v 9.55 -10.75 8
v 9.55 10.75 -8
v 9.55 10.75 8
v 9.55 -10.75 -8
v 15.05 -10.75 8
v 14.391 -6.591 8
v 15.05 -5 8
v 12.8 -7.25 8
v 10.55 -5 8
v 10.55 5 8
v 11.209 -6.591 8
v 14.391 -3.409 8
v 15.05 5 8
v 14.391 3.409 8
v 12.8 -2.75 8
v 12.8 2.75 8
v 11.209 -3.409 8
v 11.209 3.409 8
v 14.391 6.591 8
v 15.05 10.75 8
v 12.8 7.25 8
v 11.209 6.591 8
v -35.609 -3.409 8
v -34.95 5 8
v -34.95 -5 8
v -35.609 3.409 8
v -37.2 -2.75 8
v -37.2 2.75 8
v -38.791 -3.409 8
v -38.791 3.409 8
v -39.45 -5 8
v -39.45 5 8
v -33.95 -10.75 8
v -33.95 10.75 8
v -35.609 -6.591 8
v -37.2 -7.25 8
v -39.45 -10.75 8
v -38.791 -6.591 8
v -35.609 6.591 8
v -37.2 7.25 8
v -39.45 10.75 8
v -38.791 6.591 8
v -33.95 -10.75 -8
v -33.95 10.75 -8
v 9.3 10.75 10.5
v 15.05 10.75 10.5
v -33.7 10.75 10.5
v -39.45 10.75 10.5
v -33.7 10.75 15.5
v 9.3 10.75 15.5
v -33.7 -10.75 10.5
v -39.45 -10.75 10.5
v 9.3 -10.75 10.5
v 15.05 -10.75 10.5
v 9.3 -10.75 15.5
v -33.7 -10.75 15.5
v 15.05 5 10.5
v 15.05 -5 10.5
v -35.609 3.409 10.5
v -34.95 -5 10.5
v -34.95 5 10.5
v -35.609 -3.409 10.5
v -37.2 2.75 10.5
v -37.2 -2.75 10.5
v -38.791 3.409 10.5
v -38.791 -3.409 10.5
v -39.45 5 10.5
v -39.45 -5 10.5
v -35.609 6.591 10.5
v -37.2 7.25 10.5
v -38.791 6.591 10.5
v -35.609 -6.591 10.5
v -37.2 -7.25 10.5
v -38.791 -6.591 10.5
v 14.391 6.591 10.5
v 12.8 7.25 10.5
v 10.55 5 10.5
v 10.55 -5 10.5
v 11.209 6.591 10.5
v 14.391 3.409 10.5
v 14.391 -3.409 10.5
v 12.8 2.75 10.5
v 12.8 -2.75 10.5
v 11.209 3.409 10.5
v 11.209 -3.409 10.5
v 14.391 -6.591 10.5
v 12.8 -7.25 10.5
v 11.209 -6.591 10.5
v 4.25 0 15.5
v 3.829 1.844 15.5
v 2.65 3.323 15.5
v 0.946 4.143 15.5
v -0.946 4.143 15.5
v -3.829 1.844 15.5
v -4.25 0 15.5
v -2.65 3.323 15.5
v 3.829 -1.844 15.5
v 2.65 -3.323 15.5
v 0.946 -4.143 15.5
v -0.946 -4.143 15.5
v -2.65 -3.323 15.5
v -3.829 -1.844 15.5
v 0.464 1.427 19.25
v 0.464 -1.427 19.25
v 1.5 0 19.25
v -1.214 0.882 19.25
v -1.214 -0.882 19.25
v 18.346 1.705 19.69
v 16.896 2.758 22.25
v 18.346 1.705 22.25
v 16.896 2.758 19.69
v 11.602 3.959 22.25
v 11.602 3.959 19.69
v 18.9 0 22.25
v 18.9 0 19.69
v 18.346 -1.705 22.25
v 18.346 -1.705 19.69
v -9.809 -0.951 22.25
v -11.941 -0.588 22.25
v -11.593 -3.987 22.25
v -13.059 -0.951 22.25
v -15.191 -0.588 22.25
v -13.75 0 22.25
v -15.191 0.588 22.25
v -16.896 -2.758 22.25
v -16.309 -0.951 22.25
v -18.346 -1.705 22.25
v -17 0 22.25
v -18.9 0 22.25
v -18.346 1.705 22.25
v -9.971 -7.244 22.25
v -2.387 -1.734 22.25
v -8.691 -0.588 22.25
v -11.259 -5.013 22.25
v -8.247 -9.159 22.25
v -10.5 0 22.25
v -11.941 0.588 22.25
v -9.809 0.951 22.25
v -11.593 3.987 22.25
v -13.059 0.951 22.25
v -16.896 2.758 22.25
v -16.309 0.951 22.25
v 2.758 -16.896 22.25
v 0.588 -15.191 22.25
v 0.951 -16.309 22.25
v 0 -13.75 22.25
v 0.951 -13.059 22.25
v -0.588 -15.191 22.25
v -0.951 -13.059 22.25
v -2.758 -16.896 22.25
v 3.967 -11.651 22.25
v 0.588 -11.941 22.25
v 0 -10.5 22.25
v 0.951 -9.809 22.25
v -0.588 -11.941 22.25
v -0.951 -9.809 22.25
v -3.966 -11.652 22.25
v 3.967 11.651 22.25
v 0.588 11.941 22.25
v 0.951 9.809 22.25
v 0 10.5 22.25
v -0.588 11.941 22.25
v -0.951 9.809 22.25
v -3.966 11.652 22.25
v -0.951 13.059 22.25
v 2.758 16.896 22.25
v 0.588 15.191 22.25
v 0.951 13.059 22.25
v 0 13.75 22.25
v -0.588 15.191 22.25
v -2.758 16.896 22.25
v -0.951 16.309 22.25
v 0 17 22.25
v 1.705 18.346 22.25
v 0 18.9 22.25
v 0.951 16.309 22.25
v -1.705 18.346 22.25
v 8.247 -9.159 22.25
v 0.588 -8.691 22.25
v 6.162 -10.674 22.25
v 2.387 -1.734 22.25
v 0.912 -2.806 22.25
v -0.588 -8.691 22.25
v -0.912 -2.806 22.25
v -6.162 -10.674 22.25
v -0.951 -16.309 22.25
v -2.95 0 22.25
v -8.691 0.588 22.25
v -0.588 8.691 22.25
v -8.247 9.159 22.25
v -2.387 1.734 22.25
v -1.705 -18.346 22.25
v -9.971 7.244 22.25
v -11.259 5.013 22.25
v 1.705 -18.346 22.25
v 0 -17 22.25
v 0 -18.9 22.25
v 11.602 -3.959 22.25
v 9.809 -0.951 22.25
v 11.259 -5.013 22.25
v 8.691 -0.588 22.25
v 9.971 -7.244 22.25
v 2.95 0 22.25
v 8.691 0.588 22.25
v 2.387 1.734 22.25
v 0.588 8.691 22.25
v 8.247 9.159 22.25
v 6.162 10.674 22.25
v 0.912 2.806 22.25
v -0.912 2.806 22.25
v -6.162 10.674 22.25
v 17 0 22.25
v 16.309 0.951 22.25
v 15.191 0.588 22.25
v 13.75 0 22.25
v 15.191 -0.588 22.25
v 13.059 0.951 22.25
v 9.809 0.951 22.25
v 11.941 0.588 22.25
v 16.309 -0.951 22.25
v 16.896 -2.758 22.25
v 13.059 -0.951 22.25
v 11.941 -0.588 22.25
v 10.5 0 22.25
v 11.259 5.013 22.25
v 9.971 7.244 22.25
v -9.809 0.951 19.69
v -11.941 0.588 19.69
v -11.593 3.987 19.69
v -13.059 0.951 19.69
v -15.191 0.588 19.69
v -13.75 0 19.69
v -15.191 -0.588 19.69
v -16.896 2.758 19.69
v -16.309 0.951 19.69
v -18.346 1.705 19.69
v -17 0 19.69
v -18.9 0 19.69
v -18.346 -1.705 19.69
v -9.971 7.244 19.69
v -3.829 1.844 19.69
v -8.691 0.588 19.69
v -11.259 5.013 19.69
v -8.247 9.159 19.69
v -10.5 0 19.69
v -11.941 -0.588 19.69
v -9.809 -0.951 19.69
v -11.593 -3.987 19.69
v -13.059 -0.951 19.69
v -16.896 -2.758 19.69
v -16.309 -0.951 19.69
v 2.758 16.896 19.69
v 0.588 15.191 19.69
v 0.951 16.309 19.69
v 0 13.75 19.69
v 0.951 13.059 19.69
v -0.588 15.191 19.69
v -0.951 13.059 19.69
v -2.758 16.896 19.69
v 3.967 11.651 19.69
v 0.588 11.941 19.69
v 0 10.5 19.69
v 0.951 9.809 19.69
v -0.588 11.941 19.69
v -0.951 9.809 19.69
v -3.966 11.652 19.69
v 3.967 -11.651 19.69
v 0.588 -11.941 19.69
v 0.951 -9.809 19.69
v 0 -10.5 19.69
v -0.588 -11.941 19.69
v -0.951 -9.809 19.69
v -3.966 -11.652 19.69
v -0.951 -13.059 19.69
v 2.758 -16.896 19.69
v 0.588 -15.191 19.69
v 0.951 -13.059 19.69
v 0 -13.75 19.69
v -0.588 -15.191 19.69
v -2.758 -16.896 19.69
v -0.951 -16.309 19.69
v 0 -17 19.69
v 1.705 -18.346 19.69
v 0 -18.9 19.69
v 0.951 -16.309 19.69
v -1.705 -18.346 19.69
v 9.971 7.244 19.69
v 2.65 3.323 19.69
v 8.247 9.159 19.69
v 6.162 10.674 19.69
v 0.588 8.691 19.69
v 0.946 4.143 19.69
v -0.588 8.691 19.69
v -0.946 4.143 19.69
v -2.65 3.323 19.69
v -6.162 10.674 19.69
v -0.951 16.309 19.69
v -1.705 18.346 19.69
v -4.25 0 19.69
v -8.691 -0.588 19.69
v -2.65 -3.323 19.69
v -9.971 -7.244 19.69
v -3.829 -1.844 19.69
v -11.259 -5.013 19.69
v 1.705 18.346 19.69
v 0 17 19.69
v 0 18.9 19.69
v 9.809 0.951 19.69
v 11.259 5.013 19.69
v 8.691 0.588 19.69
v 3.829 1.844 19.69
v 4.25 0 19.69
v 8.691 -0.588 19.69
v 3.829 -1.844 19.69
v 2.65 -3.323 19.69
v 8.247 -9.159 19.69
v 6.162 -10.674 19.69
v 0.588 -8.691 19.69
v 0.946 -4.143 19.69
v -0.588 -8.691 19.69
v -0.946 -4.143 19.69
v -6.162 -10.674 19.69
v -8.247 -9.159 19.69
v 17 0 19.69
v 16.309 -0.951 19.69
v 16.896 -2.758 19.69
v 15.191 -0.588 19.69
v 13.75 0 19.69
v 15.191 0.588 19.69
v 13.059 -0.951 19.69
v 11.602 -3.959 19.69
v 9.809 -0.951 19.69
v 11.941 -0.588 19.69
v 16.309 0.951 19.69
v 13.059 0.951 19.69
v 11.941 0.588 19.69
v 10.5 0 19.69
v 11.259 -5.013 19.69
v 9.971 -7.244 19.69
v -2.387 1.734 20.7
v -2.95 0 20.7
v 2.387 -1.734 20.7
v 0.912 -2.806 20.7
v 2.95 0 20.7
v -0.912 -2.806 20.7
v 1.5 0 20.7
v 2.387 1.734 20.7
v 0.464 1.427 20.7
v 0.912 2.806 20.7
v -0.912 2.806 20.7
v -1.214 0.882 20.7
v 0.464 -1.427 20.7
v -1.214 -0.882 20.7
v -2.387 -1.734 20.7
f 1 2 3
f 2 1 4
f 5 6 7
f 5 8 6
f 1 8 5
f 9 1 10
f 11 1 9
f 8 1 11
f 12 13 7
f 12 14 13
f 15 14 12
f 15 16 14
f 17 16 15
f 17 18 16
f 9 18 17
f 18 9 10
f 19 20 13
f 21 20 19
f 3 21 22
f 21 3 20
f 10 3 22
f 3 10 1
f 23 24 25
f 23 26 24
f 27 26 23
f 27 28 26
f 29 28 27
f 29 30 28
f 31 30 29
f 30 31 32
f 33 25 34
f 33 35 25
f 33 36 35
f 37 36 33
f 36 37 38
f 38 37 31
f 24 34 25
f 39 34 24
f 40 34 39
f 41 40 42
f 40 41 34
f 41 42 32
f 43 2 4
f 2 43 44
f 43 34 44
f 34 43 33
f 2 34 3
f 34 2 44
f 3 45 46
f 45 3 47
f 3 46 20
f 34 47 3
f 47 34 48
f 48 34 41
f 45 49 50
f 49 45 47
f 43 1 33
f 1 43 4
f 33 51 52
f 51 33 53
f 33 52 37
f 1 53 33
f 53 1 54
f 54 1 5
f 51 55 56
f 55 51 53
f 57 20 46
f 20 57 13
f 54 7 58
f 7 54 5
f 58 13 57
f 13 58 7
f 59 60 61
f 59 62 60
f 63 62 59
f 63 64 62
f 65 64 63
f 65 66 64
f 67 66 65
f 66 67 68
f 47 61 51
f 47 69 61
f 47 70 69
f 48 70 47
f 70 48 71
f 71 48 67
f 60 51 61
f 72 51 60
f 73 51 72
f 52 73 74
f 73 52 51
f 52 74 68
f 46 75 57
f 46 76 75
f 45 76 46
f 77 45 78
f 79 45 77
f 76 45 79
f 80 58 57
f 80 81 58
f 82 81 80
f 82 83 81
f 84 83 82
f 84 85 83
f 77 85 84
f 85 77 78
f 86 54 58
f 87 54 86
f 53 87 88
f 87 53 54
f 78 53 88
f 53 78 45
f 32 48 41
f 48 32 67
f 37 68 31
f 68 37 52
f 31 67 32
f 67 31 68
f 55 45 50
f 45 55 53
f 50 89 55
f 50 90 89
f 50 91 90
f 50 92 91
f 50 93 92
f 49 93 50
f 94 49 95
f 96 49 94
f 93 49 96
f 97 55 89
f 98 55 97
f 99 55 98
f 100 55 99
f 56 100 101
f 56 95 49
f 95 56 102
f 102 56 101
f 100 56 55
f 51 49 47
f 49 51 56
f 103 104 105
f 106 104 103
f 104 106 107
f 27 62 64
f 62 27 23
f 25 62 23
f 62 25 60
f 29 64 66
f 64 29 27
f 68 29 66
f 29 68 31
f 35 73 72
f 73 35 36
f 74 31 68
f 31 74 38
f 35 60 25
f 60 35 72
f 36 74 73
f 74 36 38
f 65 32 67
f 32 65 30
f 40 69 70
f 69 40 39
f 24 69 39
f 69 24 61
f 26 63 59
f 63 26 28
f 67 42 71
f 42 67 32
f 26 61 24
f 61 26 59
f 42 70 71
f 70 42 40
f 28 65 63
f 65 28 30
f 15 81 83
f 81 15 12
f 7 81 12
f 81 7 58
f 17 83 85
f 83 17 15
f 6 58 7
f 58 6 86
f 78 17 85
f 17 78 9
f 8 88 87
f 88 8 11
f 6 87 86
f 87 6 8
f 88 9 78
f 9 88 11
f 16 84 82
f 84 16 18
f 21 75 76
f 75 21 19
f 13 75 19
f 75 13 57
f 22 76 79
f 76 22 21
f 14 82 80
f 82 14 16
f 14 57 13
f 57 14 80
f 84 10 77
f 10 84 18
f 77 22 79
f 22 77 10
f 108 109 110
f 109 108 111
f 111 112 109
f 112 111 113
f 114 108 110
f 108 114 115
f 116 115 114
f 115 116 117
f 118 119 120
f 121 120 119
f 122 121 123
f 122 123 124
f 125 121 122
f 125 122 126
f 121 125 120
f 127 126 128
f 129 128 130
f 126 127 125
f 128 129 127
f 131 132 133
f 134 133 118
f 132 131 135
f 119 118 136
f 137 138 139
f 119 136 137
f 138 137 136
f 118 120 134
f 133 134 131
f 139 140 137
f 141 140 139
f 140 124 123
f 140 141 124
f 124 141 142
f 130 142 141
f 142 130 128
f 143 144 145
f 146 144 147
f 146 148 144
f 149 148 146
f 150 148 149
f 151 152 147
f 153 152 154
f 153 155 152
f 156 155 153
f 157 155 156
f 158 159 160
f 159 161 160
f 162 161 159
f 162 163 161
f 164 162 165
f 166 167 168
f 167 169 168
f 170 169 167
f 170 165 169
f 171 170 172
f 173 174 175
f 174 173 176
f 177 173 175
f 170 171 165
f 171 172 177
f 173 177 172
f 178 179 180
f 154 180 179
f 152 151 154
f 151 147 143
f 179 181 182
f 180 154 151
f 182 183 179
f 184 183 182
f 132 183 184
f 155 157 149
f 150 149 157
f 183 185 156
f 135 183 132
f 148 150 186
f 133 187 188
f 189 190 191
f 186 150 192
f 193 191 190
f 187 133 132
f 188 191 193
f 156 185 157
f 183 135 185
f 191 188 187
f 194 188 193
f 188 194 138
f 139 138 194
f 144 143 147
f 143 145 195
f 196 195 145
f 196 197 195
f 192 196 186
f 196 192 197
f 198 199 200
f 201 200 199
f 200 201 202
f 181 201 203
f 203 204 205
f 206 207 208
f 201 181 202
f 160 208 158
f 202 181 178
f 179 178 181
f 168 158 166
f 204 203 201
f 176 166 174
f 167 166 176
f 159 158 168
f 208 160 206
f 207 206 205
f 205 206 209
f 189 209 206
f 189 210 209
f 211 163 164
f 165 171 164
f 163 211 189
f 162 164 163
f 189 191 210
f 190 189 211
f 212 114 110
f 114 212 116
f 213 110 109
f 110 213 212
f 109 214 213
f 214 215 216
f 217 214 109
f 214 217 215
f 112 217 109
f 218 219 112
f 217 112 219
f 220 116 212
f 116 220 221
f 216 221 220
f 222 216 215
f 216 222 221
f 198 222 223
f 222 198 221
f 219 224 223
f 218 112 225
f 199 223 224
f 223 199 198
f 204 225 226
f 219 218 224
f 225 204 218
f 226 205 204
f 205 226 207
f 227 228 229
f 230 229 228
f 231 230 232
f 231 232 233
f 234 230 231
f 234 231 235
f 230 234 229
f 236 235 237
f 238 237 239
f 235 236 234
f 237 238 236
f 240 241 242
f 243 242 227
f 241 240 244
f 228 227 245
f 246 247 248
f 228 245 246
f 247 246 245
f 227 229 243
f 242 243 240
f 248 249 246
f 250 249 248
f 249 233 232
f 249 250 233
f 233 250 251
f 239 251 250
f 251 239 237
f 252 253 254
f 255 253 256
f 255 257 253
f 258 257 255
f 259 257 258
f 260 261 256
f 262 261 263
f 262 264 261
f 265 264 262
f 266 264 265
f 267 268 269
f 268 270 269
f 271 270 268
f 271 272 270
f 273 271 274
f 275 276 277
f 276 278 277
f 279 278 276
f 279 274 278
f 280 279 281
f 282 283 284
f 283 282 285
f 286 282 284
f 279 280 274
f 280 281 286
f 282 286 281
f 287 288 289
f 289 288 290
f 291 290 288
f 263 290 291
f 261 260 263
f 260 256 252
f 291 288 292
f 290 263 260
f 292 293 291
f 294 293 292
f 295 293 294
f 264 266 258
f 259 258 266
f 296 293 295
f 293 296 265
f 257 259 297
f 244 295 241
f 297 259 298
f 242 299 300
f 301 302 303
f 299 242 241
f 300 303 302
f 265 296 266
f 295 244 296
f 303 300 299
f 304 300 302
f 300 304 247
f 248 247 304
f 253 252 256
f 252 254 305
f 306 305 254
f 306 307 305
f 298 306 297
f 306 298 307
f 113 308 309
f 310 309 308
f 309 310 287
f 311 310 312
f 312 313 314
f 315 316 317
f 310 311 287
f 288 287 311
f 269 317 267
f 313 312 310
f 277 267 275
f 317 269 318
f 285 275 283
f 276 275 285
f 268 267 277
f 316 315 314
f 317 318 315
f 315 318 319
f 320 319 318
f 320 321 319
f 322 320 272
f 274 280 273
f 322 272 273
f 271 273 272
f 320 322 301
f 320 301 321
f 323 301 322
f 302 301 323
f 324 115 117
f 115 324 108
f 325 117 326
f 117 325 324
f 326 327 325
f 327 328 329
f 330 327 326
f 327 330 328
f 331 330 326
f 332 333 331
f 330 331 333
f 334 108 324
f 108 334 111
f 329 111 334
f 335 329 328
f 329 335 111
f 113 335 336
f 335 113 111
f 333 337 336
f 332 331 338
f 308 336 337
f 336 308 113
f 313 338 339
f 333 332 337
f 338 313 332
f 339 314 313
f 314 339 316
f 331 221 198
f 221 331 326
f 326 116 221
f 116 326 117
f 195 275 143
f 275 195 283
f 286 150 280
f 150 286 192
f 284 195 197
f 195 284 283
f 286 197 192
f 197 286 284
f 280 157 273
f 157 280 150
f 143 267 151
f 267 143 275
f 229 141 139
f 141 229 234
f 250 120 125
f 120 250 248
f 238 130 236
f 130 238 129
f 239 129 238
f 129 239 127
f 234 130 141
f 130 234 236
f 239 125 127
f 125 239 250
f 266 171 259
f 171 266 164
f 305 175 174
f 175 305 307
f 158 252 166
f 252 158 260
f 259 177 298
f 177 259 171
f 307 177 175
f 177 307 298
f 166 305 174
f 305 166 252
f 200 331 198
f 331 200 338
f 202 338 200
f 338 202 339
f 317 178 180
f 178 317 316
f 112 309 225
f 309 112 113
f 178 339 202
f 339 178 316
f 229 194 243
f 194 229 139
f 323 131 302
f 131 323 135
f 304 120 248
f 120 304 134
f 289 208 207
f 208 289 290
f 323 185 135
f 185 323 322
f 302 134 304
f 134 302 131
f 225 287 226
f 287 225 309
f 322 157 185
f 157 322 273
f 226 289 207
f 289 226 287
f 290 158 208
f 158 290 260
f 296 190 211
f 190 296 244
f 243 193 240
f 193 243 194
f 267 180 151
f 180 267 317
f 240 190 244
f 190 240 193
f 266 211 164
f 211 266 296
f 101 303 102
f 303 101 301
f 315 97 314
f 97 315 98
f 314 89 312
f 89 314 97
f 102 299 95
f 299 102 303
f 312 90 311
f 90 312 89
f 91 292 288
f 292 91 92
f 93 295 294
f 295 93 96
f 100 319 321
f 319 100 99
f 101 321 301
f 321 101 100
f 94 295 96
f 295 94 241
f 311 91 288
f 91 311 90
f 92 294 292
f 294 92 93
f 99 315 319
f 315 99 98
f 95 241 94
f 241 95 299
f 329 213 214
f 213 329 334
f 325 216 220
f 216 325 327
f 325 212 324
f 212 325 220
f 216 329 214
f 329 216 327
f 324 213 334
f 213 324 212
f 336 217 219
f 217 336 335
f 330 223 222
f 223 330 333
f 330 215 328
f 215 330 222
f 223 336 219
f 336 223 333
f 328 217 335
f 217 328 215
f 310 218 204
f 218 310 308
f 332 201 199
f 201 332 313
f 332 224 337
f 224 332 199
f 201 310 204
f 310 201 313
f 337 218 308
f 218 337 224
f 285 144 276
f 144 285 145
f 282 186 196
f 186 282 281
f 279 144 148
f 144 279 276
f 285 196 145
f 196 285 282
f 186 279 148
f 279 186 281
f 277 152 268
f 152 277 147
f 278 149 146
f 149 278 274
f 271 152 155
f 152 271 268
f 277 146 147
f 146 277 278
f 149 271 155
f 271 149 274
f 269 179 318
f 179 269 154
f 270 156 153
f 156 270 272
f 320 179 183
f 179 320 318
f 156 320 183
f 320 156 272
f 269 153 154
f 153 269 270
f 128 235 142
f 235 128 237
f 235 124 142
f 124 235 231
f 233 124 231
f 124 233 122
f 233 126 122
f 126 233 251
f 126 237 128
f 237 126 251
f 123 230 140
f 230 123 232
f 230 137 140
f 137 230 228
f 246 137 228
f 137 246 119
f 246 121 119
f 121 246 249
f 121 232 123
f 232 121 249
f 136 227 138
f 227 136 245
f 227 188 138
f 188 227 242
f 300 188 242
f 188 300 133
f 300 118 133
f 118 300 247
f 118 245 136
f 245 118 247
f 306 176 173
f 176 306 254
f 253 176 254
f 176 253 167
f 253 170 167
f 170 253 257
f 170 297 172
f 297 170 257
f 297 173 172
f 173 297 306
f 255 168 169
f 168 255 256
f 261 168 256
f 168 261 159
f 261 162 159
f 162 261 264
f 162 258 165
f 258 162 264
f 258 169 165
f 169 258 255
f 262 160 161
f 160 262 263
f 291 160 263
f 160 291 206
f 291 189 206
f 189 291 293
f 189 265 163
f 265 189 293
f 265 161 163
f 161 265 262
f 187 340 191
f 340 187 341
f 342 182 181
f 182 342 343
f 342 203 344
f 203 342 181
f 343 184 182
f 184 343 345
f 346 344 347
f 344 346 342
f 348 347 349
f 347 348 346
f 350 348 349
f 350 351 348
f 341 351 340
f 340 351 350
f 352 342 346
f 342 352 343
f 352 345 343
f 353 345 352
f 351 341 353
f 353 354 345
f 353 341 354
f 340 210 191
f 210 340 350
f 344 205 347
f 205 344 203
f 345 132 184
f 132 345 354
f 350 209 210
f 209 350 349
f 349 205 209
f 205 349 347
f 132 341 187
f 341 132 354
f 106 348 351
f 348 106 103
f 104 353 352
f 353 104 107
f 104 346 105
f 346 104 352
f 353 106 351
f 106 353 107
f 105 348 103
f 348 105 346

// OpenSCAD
module make_BMS706MG_servo_holes(d=4.5){
        //mount holes
        for(i=[-1:2:1]){
            for(j=[-1:2:1]){
                color("blue")
                translate([50/2*i,10/2*j,0])
                cylinder(d=d, h=30, center=true);
            }
        }
}

module make_BMS706MG_servo_horn_round_holes(hole_space=1.25, hole_d=2, hole_h=10, a=1, b=1, c=1){

            for(i=[0:3])
            for(j=[0:2])
            color("blue")
            rotate([0,0,90*i])
            translate([16-(hole_space+2)*j,0,0])
            if((j==0 && a==1) || (j==1 && b==1) || (j==2 && c==1))
            cylinder(d=hole_d, h=hole_h, center=true);
}

module make_BMS706MG_servo_horn_round(bb=0, d_tolerance=0, d_extra=0){

	hole_space = 1.25;

    if(bb){

        cylinder(d=45+d_extra, h=2.56*2);

    }else{
    	difference(){
    		union(){
    		
    			cylinder(d=24.65, h=2.56);
    		
    			translate([0,0,0])
    			cylinder(d=8.5+d_tolerance, h=6.75);
    		
    			for(i=[0:3])
    			hull(){
    				rotate([0,0,90*i])
    				translate([16,0,0])
    				cylinder(d=5.8, h=2.56);
    				cylinder(d=13, h=2.56);
    			}
    	
    		}
    	   /*
    		for(i=[0:3])
    		for(j=[0:2])
    		color("blue")
    		rotate([0,0,90*i])
    		translate([16-(hole_space+2)*j,0,-1])
    		cylinder(d=2, h=5);
    		*/
    		make_BMS706MG_servo_horn_round_holes(hole_space=hole_space);
    	
    		color("blue")
    		translate([0,0,-10+1.55])
    		cylinder(d=5.9, h=10);
    	
    		cylinder(d=3, h=100, center=true);
    	}
	}
}

module make_BMS706MG_servo(horn=0, d_tolerance=0){

	nub_offset_x = 43/2-9.3;

	translate([-nub_offset_x,0,0])
	difference(){
		union(){
			//main body
			//color("green")
			cube([43.5,21.5,16], center=true);
		
			//mount tabs
			translate([0,0,16/2+2.5/2])
			cube([54.5,21.5,2.5], center=true);
		
			//top body
			//color("red")
			translate([0,0,5/2+16/2+2.5])
			cube([43,21.5,5], center=true);
		
			//nub
			color("red")
			translate([nub_offset_x,0,16/2+2.5+5])
			cylinder(d=6+d_tolerance, h=3.75);
		}
		make_BMS706MG_servo_holes();
	}

	if(horn){
		
		translate([0,0,30-7.75])
		rotate([180,0,0])
		make_BMS706MG_servo_horn_round(bb=0, d_tolerance=d_tolerance);

	}

}


make_BMS706MG_servo(horn=1);
